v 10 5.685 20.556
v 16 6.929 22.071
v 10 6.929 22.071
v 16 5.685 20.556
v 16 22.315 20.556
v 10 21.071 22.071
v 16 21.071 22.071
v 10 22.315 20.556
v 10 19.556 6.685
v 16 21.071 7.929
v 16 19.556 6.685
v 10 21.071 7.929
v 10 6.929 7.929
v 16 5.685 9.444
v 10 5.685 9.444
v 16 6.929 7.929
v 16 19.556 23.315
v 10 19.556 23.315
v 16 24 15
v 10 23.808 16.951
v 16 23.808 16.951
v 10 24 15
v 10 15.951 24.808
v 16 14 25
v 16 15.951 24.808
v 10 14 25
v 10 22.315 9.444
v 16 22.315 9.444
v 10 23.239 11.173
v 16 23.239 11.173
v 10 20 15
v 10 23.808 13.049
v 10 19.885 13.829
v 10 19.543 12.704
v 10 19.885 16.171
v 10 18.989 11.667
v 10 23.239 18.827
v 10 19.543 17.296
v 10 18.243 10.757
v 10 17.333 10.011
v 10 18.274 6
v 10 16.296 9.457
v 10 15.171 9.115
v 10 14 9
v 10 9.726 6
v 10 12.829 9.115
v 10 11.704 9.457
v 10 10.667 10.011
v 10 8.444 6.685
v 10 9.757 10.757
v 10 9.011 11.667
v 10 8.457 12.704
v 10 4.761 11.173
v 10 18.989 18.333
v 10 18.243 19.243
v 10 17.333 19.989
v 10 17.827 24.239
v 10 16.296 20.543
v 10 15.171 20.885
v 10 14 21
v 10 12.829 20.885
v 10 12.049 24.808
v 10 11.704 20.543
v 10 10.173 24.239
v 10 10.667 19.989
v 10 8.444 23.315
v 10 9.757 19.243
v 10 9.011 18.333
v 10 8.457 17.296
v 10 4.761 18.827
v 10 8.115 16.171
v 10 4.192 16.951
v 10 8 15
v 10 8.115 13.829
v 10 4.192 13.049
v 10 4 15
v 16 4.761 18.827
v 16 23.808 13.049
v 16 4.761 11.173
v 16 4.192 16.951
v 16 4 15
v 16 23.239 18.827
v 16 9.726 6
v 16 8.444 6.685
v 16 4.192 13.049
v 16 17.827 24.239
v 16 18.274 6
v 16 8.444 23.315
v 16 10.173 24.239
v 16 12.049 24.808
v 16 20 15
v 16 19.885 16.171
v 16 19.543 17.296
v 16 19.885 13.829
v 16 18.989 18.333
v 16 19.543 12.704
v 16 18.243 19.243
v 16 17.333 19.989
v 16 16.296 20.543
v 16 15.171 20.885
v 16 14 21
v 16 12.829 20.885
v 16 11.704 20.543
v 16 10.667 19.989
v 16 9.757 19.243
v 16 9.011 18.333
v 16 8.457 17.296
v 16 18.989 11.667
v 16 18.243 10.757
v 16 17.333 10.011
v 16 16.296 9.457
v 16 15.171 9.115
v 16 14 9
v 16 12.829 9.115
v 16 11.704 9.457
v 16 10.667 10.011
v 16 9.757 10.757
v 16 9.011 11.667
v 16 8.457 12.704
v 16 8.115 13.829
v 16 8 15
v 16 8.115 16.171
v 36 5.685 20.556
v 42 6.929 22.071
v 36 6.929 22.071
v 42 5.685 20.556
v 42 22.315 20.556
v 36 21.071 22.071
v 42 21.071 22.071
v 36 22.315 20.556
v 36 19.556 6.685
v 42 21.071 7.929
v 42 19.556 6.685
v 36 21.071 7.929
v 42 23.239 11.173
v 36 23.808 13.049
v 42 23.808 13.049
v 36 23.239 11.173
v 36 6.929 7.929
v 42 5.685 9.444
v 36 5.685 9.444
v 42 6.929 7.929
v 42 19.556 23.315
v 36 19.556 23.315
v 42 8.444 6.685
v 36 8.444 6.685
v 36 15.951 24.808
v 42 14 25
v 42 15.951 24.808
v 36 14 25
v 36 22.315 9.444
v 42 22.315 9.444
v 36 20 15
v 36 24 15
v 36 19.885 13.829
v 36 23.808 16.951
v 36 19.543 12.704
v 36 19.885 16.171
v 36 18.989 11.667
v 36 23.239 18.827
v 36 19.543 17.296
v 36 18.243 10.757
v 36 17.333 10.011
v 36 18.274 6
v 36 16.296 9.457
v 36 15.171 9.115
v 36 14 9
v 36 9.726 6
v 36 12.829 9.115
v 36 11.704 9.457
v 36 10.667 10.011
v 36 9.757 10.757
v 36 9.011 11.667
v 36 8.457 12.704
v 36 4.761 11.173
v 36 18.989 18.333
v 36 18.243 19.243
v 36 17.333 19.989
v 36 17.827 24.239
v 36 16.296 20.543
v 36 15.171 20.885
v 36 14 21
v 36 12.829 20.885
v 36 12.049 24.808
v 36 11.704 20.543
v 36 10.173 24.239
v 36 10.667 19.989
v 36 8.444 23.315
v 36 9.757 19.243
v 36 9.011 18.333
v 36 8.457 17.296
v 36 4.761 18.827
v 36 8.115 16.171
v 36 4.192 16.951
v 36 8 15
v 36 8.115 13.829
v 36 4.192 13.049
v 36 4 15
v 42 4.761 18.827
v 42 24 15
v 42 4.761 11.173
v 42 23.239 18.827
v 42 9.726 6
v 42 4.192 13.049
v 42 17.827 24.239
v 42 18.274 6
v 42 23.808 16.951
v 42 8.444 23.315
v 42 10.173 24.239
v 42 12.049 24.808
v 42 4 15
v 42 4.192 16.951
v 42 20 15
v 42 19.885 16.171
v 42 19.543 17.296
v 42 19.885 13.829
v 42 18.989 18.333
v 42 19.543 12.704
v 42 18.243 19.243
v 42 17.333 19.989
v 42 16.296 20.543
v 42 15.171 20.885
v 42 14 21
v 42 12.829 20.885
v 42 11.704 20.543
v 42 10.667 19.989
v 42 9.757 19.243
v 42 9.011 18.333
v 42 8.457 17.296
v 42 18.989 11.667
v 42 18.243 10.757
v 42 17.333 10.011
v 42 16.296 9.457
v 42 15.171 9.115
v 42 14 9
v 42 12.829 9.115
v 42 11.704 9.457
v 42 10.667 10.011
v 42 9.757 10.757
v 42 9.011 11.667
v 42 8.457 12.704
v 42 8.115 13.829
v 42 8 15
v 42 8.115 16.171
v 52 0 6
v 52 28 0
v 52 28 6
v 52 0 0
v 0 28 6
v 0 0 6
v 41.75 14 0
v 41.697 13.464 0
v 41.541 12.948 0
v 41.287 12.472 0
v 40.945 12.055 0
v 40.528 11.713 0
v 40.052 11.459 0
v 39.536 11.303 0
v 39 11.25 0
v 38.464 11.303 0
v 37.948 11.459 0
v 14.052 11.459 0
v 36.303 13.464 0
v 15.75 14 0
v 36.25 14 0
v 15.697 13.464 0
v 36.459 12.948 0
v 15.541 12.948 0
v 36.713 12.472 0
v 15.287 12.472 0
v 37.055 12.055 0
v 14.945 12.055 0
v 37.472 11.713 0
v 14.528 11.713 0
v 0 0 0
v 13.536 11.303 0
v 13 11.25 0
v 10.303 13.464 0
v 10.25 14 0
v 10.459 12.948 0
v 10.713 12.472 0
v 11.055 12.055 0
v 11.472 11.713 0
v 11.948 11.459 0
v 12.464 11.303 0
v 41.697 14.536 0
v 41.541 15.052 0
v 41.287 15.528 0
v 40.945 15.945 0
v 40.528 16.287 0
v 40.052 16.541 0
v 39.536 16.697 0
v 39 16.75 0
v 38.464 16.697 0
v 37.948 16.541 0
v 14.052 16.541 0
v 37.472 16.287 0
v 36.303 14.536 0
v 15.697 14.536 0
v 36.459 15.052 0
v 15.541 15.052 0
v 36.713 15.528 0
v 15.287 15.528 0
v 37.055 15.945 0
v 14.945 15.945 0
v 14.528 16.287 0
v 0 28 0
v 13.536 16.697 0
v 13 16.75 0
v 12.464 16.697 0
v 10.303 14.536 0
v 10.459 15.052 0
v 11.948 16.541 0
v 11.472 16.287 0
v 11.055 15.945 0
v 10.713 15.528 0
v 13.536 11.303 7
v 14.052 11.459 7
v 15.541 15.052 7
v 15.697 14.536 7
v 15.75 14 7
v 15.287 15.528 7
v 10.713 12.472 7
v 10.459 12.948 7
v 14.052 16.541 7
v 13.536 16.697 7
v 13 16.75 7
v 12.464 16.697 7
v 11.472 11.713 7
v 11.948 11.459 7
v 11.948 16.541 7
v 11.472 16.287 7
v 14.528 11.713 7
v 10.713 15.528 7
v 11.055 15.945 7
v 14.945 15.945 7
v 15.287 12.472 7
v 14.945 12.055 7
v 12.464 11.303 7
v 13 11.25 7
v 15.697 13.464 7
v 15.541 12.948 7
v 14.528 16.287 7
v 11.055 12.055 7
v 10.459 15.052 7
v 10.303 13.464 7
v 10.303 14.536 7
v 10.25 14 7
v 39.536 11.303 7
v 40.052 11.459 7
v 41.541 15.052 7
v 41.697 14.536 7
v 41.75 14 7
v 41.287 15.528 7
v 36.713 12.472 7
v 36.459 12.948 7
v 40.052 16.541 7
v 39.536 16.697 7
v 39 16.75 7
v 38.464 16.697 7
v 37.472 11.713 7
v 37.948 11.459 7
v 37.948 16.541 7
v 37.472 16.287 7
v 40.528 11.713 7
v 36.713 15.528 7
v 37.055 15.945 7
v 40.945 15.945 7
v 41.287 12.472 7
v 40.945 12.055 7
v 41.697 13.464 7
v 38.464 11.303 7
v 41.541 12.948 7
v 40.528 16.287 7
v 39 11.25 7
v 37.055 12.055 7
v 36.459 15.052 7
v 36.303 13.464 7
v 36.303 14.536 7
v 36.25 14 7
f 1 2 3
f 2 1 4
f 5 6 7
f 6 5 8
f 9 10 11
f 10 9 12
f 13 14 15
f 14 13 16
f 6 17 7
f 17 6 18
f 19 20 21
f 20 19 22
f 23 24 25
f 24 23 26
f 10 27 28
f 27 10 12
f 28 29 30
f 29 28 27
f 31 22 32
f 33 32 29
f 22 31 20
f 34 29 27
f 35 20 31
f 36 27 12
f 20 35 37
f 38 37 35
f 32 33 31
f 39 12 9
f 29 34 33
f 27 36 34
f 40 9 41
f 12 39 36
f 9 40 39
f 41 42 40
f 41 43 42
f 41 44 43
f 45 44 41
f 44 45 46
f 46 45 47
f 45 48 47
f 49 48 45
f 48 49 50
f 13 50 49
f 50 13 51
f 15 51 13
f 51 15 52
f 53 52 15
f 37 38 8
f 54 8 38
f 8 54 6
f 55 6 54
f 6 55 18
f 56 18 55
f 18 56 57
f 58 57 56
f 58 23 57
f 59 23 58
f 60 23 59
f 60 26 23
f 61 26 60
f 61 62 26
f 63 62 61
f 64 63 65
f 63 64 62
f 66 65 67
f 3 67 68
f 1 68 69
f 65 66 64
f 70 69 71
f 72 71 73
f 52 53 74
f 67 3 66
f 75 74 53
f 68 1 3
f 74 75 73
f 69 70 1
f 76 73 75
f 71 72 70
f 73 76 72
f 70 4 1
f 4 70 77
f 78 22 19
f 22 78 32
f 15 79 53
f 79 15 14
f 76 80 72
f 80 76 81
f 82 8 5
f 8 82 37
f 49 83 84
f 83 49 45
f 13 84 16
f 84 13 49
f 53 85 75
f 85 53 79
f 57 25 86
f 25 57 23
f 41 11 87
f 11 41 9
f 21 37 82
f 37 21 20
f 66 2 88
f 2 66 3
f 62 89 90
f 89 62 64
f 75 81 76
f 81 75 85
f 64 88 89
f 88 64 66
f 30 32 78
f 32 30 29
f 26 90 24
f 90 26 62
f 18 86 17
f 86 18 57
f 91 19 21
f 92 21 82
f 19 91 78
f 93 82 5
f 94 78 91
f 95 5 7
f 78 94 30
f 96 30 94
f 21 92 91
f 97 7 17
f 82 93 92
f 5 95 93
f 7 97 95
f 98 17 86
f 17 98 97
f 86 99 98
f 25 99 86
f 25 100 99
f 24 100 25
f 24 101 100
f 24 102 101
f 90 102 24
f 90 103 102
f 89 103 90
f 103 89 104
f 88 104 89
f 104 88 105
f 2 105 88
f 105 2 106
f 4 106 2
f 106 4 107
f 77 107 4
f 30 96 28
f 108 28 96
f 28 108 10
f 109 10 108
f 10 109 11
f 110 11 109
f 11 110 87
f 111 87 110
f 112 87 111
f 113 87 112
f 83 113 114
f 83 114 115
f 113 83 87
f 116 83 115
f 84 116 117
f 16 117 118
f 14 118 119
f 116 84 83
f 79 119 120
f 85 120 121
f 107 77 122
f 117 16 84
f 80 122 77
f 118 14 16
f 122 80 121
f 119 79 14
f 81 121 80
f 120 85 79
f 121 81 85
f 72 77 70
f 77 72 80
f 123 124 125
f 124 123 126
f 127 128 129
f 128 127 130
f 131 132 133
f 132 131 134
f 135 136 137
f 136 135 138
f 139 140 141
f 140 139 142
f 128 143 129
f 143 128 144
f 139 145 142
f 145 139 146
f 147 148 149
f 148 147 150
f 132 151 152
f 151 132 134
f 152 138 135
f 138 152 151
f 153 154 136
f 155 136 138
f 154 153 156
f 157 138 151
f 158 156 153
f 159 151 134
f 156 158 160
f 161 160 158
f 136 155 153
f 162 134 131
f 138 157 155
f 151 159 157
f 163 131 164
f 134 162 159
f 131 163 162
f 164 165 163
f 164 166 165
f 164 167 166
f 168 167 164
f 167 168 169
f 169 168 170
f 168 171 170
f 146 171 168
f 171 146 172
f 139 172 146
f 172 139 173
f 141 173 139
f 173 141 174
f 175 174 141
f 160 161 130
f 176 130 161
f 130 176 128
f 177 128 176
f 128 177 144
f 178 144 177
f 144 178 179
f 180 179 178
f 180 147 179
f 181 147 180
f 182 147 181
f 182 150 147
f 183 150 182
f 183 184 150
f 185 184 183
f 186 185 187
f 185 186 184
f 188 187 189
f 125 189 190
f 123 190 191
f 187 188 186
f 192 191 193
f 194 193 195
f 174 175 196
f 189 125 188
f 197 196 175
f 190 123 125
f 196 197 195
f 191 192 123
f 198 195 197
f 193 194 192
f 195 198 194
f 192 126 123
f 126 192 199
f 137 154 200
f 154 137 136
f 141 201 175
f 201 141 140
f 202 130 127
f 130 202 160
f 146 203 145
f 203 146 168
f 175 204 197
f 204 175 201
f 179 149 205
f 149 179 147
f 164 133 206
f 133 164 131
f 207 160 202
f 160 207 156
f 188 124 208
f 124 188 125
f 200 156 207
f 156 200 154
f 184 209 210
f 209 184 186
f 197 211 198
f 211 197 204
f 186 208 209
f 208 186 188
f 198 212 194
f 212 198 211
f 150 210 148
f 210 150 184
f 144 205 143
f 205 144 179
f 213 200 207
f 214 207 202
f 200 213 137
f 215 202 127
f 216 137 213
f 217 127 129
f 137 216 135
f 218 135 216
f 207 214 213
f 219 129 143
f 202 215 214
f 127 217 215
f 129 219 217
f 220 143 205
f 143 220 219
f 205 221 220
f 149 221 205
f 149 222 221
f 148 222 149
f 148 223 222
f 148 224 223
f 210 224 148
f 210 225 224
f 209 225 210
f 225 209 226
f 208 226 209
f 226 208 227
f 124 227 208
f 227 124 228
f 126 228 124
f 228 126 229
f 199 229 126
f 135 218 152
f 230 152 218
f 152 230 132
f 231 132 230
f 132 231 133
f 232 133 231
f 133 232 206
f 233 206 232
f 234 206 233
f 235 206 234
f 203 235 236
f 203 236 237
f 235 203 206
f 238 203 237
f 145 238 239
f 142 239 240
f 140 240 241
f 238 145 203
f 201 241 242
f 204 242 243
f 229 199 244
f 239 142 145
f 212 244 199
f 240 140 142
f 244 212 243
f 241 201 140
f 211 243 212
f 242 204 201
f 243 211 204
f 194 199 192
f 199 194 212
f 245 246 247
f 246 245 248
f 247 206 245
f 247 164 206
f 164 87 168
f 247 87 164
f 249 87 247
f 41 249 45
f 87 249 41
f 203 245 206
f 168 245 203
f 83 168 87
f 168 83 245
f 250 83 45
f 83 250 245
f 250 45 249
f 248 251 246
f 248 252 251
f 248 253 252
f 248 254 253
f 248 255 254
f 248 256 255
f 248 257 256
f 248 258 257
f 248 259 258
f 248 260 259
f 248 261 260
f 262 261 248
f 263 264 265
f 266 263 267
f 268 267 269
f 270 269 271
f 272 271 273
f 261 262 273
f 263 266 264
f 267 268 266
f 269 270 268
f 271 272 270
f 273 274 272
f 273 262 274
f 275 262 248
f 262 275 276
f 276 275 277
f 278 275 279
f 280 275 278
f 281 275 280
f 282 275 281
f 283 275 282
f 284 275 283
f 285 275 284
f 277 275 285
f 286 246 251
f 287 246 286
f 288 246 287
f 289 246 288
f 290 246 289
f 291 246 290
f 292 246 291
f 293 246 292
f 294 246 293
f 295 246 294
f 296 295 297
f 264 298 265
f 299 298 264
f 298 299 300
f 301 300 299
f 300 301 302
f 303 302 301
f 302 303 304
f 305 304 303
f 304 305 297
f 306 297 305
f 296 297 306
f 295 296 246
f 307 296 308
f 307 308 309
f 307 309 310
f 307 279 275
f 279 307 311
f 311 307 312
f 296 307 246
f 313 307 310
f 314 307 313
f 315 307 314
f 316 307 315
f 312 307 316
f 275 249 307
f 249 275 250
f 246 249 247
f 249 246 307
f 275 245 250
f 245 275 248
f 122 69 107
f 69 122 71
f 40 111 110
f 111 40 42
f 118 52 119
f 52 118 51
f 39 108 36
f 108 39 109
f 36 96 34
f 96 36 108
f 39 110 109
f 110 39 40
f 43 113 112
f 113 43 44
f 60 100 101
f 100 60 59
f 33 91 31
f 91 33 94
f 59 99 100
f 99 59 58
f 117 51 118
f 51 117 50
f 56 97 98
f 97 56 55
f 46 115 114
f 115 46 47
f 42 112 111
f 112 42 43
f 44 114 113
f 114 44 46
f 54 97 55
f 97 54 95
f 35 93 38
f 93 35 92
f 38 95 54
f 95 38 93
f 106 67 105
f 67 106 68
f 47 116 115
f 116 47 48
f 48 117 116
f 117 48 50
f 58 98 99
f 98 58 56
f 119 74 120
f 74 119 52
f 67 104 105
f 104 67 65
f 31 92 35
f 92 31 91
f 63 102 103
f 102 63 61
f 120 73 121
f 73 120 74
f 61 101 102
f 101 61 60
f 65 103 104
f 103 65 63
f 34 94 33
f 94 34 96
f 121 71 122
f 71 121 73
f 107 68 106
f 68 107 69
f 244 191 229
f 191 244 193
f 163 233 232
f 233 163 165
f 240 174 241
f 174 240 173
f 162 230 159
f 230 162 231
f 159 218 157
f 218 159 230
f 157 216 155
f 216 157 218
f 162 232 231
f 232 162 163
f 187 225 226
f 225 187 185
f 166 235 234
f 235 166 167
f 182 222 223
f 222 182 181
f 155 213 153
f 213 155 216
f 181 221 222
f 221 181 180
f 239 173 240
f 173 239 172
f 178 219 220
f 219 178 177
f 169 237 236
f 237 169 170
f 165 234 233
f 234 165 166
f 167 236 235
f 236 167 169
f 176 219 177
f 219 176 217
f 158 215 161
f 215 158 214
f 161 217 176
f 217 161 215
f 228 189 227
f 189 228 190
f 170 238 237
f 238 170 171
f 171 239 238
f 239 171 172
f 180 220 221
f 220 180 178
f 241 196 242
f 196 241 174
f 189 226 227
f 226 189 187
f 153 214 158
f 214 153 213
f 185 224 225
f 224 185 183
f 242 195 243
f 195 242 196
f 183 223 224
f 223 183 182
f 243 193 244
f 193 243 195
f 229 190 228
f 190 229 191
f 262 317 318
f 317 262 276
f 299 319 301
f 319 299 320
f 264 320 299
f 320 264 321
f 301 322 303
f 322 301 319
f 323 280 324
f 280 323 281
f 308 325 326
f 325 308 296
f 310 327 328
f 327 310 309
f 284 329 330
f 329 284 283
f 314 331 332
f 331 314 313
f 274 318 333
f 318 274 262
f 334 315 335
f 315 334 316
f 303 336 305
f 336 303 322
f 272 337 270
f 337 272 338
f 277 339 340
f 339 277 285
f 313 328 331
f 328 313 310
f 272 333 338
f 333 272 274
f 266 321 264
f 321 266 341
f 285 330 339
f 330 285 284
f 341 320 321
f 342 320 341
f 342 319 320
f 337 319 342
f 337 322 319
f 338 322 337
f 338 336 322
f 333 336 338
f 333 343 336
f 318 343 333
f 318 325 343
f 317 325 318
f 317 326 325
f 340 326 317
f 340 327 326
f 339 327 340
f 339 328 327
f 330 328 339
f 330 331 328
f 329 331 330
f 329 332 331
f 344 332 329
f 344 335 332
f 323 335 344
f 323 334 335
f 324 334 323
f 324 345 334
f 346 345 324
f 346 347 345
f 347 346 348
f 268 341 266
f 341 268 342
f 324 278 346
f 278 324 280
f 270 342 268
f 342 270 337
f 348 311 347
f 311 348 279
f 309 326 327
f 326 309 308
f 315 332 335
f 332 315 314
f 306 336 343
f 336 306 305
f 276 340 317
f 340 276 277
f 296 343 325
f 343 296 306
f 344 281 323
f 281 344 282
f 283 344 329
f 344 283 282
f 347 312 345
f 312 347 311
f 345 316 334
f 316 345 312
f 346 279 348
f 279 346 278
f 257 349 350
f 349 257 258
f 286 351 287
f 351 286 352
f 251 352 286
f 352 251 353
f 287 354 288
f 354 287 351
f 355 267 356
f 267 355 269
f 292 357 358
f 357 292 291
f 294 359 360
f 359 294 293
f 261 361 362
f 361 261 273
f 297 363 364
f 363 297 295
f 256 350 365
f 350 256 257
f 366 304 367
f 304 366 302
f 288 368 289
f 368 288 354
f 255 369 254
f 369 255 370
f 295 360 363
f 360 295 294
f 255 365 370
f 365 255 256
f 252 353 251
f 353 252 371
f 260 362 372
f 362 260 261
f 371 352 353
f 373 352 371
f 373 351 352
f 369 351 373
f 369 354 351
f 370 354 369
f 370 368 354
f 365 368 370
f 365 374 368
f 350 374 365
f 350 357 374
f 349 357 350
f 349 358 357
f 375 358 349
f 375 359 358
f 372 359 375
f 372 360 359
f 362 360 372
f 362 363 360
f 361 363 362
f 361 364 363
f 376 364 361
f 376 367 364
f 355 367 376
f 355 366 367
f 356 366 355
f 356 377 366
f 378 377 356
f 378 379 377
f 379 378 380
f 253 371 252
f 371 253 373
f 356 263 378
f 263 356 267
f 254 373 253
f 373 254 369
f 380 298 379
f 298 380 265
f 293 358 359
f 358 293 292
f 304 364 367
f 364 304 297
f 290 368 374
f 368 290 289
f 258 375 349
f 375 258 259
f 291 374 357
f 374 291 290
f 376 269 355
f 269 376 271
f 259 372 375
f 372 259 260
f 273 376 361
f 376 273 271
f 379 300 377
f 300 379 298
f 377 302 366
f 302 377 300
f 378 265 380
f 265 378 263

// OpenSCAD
$fn = 32;

// ----------------------------------------------------------------------
// Cable clip: cable 12 mm, clamp 20 mm, base 52 mm
// ----------------------------------------------------------------------

// --- parameters (mm) ---
plate_x = 52;             // base length, X
plate_y = 28;             // base width, Y
plate_t = 6;              // base thickness
wire_seat_d = 20;         // clamp outside diameter
clip_t = 4;               // clamp wall
cable_d = 12;             // cable opening
ring_w = 6;               // clamp width along the cable
screw_d = 5.5;            // screw clearance
sink = 1;                 // overlap of the clamp into the base
pitch = 26;               // distance between the two clamps

module base() {
  cube([plate_x, plate_y, plate_t]);
}

module clamps() {
  for (sx = [-1, 1])
    translate([plate_x / 2 + sx * pitch / 2, plate_y / 2, plate_t + wire_seat_d / 2 - sink]) rotate([0, 90, 0])
      cylinder(h = ring_w, d = wire_seat_d, center = true);
}

difference() {
  union() {
    base();
    clamps();
  }
  for (sx = [-1, 1])
    translate([plate_x / 2 + sx * pitch / 2, plate_y / 2, plate_t + wire_seat_d / 2 - sink]) rotate([0, 90, 0]) translate([0, 0, -ring_w / 2 - 1]) cylinder(h = ring_w + 2, d = cable_d);
  translate([13, plate_y / 2, -1]) cylinder(h = plate_t + 2, d = screw_d);
  translate([39, plate_y / 2, -1]) cylinder(h = plate_t + 2, d = screw_d);
}
